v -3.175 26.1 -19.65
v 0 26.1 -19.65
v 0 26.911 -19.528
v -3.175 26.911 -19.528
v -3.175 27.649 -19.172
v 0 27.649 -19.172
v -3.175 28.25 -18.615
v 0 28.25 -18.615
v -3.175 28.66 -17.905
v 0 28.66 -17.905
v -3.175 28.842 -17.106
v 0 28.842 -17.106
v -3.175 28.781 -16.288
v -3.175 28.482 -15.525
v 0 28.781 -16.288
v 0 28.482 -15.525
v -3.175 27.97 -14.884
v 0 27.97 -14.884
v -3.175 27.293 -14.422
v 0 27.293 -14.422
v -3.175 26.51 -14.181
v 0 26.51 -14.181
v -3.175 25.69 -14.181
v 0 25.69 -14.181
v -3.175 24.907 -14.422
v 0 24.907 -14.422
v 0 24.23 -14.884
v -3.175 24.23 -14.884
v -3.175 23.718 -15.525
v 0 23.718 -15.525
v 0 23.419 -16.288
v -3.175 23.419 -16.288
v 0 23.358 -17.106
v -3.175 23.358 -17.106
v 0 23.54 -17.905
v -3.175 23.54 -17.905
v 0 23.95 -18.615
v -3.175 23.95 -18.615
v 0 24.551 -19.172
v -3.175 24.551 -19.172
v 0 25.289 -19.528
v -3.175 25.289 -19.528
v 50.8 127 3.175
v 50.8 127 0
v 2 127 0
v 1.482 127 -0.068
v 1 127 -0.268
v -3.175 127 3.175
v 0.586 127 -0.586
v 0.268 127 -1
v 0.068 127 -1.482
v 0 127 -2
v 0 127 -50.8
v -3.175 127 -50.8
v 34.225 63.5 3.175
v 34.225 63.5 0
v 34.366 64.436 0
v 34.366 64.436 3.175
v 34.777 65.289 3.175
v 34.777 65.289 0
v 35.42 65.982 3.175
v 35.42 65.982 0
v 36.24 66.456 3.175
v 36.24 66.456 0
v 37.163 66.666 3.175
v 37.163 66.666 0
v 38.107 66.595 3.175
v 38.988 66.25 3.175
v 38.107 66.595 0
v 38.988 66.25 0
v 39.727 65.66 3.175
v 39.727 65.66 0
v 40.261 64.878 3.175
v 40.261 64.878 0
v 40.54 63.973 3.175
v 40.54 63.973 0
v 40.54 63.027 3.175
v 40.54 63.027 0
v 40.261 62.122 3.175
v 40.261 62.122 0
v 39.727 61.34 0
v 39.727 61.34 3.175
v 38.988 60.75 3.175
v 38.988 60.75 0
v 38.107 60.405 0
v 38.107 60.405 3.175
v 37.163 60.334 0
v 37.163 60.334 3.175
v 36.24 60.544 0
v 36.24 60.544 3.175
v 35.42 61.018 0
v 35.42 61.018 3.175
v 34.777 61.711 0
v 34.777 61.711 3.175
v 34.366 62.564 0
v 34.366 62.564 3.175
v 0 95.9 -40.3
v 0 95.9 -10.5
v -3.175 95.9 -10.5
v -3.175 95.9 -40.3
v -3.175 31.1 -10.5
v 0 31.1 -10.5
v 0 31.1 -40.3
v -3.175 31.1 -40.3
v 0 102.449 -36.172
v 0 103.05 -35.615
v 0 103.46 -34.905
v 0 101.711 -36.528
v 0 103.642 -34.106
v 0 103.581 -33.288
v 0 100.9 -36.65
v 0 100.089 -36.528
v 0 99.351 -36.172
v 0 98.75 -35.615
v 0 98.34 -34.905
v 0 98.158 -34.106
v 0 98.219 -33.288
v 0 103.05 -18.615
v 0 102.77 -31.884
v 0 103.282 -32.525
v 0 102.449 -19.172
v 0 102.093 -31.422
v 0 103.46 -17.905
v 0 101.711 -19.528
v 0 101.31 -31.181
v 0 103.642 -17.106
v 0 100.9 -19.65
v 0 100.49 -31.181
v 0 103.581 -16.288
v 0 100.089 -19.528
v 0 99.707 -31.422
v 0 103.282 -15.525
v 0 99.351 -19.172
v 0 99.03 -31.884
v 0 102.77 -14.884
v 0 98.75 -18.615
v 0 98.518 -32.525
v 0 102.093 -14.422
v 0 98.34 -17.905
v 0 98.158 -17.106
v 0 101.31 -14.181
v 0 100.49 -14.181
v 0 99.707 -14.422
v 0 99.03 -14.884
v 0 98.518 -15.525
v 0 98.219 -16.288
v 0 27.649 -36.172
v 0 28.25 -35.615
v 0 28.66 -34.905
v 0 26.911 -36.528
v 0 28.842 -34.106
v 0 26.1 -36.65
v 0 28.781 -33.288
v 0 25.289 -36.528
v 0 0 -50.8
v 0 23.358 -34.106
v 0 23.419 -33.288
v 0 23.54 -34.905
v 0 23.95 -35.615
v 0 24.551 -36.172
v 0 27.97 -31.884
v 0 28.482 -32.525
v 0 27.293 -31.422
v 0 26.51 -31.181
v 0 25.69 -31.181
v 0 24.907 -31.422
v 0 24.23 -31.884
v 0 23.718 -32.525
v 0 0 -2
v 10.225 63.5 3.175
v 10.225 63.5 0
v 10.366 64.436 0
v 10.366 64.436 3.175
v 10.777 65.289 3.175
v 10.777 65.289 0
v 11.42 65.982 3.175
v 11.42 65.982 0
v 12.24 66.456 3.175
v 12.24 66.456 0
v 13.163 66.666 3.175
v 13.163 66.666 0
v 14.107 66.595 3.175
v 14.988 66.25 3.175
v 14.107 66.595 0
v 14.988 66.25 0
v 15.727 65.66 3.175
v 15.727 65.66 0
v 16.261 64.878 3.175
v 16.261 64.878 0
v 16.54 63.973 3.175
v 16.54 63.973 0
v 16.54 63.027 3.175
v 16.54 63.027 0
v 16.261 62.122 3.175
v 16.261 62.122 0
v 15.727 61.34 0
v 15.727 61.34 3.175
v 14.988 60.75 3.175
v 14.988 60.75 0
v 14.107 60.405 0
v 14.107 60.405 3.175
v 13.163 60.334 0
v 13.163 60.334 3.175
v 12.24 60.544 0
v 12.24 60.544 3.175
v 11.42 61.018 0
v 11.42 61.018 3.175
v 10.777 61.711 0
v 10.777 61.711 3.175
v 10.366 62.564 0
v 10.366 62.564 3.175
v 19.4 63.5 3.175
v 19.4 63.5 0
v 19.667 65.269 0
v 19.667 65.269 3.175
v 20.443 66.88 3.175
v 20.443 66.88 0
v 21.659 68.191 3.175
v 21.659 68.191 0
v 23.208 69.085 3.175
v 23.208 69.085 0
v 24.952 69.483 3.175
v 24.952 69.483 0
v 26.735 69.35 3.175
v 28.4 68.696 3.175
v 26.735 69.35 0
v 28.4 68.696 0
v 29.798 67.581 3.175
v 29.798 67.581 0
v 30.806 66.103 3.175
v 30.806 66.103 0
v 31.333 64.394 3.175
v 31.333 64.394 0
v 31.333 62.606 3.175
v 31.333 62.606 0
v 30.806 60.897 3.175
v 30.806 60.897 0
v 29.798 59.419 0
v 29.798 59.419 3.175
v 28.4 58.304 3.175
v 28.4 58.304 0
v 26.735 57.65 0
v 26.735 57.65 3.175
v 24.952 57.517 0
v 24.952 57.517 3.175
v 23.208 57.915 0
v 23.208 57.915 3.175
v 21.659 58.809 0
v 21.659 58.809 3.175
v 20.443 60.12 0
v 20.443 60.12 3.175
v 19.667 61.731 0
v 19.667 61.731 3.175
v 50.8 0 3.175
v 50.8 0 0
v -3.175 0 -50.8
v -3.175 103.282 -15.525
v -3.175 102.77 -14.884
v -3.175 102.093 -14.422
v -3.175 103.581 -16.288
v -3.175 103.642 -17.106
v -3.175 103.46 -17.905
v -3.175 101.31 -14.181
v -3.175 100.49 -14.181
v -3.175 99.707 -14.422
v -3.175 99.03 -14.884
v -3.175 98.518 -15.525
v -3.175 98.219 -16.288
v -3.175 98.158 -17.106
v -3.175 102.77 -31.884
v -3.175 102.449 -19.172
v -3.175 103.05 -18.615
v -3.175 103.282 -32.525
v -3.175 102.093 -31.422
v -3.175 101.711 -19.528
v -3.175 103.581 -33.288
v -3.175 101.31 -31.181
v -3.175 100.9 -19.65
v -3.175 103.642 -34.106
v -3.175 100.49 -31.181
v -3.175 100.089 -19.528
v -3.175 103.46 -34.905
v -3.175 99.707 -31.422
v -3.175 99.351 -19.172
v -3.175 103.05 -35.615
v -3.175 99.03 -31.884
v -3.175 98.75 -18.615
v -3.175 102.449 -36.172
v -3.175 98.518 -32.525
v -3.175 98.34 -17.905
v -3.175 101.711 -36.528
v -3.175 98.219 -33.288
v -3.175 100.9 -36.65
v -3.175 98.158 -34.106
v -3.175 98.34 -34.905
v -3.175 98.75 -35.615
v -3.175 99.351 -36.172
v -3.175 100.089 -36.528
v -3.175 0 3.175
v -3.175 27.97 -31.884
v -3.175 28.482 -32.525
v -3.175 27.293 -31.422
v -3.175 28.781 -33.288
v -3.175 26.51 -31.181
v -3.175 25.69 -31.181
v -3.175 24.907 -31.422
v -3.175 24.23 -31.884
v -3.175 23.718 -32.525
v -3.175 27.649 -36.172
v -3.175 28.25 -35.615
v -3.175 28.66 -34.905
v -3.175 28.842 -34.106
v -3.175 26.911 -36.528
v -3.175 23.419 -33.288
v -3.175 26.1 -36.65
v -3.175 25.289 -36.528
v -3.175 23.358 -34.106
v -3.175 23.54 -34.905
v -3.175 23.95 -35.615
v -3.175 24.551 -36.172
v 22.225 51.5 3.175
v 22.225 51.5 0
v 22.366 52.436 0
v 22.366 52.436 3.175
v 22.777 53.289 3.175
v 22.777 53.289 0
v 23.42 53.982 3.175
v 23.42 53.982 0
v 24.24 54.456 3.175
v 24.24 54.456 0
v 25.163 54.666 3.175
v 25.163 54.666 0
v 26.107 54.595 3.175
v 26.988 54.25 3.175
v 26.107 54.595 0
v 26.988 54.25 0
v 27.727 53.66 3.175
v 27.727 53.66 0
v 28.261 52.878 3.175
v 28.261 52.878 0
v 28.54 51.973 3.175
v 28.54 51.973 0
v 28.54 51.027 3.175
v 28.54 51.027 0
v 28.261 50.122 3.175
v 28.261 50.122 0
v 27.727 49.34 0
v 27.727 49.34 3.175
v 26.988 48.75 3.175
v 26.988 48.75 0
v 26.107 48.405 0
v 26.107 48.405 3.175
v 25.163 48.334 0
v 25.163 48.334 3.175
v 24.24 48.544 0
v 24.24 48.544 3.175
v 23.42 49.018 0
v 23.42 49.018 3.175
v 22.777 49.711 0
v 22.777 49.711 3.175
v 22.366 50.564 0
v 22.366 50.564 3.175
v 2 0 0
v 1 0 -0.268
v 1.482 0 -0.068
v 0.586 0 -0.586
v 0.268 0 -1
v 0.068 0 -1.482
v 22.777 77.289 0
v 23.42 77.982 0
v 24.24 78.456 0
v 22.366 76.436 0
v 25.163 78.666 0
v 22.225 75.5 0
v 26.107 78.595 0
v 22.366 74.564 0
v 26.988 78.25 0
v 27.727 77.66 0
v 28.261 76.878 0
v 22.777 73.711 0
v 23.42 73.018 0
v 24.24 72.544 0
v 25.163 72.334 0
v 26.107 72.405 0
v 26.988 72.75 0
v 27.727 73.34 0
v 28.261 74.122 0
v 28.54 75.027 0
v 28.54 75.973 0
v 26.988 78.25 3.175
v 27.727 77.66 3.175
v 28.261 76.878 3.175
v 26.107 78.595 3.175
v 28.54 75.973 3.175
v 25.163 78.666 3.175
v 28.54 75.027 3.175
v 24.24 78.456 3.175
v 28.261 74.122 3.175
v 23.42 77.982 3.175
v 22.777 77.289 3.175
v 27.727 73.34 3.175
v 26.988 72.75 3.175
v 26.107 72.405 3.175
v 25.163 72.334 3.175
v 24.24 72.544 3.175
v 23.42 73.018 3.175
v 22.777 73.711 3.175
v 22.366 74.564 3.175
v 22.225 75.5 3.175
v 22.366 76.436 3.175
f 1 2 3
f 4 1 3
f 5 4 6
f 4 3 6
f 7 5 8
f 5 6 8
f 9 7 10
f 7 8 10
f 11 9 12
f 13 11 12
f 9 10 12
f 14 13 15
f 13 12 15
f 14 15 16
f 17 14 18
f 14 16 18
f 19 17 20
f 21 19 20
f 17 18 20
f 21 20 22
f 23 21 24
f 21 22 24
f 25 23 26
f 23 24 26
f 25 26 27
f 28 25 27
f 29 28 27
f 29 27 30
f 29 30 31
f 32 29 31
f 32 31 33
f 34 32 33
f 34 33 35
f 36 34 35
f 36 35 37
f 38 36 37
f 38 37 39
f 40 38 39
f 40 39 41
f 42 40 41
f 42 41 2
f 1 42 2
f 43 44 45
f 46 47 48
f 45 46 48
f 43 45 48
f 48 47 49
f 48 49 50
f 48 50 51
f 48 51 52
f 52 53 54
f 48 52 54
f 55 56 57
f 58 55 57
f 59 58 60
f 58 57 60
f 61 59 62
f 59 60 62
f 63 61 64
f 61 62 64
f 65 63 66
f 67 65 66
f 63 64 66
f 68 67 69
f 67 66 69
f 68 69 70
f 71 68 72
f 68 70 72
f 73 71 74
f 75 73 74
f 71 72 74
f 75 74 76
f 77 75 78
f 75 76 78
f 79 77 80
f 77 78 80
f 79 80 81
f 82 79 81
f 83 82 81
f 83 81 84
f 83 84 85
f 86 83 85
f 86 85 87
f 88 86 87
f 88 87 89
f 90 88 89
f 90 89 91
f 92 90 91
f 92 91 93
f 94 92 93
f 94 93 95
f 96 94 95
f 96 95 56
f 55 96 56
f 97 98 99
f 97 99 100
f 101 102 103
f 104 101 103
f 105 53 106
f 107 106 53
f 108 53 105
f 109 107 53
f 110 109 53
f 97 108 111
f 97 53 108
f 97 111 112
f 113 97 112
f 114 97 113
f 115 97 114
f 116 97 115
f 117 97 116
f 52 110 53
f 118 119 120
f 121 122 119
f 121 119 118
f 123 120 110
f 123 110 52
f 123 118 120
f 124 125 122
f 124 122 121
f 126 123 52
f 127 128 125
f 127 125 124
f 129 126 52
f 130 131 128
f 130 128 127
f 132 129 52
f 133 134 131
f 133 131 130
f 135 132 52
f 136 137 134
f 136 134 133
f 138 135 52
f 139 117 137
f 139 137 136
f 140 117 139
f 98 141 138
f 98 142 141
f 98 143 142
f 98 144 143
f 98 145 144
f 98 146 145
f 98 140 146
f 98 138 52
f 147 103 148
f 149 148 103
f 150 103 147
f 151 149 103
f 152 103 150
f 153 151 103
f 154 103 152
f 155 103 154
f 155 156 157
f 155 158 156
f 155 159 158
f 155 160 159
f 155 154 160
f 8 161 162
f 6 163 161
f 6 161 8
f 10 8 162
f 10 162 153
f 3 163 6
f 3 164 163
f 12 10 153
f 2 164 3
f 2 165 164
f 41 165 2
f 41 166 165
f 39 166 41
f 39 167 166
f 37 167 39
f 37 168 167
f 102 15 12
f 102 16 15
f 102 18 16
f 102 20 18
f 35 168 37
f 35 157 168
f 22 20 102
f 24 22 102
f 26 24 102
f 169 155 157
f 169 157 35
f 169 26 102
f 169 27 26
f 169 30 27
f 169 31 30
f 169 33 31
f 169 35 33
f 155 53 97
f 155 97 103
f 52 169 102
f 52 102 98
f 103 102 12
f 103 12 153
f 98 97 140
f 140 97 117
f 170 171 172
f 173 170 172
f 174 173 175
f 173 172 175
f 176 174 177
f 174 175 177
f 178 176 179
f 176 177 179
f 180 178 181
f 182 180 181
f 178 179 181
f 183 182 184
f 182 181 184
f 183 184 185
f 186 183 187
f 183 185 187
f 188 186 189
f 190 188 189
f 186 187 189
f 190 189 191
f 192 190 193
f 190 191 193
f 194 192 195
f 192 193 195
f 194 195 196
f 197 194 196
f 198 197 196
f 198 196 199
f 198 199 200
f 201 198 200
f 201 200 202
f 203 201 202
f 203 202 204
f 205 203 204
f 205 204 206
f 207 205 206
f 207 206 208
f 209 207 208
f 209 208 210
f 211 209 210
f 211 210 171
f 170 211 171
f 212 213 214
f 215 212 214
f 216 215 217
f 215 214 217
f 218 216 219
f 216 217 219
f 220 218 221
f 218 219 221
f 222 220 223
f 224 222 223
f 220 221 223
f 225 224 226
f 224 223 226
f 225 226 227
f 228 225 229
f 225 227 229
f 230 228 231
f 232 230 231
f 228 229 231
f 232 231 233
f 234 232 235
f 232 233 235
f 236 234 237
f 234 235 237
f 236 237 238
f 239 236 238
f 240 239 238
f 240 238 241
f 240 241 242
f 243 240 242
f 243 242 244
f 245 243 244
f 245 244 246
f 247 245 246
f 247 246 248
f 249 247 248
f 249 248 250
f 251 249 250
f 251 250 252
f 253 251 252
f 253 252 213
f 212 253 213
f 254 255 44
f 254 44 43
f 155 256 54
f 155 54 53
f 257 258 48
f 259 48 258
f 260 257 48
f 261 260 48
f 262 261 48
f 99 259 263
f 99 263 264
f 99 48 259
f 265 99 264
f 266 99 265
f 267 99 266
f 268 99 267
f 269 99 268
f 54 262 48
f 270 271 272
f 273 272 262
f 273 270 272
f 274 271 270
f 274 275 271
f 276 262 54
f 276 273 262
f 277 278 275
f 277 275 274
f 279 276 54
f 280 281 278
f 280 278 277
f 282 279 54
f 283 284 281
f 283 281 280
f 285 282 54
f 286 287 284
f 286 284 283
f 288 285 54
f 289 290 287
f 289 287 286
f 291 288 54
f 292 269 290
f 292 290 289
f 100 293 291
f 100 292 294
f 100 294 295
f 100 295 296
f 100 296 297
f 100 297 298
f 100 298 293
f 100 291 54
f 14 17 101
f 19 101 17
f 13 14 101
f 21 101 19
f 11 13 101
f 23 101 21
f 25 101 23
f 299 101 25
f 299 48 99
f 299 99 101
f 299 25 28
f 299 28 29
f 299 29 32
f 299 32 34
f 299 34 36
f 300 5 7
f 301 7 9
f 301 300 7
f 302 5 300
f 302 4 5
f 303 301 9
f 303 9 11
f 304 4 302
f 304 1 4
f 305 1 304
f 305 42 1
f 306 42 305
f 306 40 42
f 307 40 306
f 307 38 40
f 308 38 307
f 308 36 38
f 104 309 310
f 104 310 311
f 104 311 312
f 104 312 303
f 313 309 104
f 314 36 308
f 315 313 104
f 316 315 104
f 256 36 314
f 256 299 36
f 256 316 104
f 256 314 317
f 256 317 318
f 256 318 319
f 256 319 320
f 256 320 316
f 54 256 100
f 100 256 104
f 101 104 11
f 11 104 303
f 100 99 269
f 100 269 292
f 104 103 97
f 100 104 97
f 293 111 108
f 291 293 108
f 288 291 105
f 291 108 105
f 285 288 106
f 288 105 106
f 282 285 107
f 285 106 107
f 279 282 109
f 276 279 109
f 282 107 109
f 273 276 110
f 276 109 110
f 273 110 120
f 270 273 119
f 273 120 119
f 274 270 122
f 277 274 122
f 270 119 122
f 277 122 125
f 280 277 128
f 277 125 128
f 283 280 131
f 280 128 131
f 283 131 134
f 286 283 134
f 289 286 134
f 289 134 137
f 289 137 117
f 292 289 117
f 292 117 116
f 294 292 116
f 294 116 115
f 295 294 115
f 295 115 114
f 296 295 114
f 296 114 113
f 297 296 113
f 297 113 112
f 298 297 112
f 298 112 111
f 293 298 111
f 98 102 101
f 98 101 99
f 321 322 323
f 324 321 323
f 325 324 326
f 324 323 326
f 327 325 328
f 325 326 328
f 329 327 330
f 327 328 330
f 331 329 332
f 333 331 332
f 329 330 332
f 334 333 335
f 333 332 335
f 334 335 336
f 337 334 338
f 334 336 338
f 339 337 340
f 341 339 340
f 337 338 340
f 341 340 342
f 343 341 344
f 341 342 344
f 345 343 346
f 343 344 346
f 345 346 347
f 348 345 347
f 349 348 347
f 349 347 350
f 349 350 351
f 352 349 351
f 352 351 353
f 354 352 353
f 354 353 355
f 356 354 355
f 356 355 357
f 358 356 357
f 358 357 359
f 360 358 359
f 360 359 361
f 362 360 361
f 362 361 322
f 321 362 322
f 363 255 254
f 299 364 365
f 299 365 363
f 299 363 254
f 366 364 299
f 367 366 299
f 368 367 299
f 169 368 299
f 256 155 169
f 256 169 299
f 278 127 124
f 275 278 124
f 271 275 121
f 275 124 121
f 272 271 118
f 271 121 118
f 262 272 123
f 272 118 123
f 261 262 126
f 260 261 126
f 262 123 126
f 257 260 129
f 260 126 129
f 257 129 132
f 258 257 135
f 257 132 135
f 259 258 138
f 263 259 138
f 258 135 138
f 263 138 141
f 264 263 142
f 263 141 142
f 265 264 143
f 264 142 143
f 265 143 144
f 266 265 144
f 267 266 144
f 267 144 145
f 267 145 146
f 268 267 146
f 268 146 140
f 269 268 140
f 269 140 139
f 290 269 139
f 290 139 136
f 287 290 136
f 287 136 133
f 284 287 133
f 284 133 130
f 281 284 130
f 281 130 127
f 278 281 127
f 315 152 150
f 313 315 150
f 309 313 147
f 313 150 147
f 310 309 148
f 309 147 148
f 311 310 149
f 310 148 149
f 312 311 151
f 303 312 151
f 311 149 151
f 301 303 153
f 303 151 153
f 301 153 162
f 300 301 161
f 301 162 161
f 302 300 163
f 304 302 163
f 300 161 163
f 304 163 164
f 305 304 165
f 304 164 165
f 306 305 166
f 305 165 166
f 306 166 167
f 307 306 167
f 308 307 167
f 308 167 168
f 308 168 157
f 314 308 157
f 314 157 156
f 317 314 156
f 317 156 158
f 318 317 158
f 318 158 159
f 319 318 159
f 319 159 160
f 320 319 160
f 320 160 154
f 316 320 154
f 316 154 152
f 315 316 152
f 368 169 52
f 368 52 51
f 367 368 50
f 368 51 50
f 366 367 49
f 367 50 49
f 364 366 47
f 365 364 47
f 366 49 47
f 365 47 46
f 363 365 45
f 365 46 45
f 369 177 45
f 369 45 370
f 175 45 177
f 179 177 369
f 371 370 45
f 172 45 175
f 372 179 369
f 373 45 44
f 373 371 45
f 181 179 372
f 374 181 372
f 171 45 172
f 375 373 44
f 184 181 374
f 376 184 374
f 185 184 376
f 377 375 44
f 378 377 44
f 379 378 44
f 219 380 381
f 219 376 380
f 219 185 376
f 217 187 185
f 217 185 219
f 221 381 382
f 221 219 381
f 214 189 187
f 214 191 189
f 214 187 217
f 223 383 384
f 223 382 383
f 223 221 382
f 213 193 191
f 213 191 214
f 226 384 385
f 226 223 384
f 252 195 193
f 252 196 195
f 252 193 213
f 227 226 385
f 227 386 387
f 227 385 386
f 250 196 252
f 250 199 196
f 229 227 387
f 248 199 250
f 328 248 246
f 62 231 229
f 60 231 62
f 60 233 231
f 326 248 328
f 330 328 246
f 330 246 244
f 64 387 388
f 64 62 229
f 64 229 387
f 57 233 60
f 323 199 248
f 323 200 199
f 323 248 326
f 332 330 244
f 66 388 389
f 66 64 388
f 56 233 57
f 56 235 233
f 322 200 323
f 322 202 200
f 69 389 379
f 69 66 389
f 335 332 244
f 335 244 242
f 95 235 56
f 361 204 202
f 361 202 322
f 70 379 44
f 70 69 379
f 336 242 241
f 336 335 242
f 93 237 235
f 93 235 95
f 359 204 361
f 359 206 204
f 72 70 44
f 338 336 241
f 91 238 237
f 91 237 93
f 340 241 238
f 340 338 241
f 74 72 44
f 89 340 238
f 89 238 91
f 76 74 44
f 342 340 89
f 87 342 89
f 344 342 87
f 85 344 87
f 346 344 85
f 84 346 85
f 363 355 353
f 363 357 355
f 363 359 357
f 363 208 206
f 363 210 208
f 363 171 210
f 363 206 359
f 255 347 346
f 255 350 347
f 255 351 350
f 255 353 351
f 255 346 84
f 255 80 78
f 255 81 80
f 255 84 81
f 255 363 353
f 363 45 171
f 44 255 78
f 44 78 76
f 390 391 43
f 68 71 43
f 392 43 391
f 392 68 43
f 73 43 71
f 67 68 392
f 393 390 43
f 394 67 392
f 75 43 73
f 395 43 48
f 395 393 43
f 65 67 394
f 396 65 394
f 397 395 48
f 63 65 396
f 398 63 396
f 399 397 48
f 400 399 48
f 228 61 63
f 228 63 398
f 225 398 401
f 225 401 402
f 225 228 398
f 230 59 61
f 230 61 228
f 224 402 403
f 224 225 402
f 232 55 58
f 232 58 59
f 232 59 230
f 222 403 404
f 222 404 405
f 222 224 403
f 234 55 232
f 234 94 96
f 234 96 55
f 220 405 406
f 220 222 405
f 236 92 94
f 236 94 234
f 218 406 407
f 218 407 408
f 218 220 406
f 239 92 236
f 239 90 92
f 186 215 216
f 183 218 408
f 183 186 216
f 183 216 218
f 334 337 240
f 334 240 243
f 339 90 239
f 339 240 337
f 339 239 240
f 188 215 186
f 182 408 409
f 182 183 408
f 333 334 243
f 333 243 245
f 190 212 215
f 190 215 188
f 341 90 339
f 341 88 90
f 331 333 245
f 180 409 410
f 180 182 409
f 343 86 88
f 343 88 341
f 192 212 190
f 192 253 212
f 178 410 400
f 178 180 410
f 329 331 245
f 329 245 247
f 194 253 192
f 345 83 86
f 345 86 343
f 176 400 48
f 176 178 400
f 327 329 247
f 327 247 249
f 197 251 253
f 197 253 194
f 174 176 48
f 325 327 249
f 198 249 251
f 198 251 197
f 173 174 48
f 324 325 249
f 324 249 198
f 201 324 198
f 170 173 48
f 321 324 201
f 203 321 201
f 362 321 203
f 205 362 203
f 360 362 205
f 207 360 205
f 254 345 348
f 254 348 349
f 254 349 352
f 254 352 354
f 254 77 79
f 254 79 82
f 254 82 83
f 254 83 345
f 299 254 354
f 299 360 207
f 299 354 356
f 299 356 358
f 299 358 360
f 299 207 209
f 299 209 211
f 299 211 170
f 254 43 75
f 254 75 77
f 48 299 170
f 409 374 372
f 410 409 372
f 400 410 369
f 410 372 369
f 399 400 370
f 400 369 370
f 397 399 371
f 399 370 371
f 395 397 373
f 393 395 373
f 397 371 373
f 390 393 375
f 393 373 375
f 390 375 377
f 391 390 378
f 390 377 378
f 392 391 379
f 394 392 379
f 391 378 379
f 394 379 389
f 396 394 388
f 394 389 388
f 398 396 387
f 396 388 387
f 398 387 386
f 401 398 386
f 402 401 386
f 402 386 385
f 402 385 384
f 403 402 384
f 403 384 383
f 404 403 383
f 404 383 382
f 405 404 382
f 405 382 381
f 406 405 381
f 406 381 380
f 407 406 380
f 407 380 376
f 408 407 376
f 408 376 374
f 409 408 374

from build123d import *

# Parameters (mm, degrees)
BOSS_EXTRUDE1_DEPTH = 127
CUT_EXTRUDE1_REACH  = 147.912
SKETCH2_R           = 6
SKETCH2_R_2         = 3.175
CUT_EXTRUDE2_REACH  = 147.912
SKETCH3_R           = 2.75
SKETCH3_W           = 29.8
SKETCH3_H           = 64.8
FILLET1_R           = 2


with BuildPart() as part:
    # Sketch1 → Boss-Extrude1 (new body)
    with BuildSketch(Plane(origin=(0, 0, 0), x_dir=(1, 0, 0), z_dir=(0, 1, 0))):
        Polygon((0, 50.8), (0, 0), (50.8, 0), (50.8, -3.175), (-3.175, -3.175), (-3.175, 50.8), align=None)
    extrude(amount=BOSS_EXTRUDE1_DEPTH)

    # Sketch2 → Cut-Extrude1 (cut, up to next)
    with BuildSketch(Plane(origin=(0, 0, 0), x_dir=(-1, 0, 0), z_dir=(0, 0, -1)), mode=Mode.PRIVATE) as cut_extrude1_sk1:
        with Locations((-25.4, 63.5)):
            Circle(SKETCH2_R)
    cut_extrude1_tool1 = extrude(cut_extrude1_sk1.sketch, amount=-CUT_EXTRUDE1_REACH, mode=Mode.PRIVATE) & part.part
    # Sketch2 → Cut-Extrude1 (cut, up to next)
    with BuildSketch(Plane(origin=(0, 0, 0), x_dir=(-1, 0, 0), z_dir=(0, 0, -1)), mode=Mode.PRIVATE) as cut_extrude1_sk2:
        with Locations((-25.4, 75.5)):
            Circle(SKETCH2_R_2)
    cut_extrude1_tool2 = extrude(cut_extrude1_sk2.sketch, amount=-CUT_EXTRUDE1_REACH, mode=Mode.PRIVATE) & part.part
    # Sketch2 → Cut-Extrude1 (cut, up to next)
    with BuildSketch(Plane(origin=(0, 0, 0), x_dir=(-1, 0, 0), z_dir=(0, 0, -1)), mode=Mode.PRIVATE) as cut_extrude1_sk3:
        with Locations((-13.4, 63.5)):
            Circle(SKETCH2_R_2)
    cut_extrude1_tool3 = extrude(cut_extrude1_sk3.sketch, amount=-CUT_EXTRUDE1_REACH, mode=Mode.PRIVATE) & part.part
    # Sketch2 → Cut-Extrude1 (cut, up to next)
    with BuildSketch(Plane(origin=(0, 0, 0), x_dir=(-1, 0, 0), z_dir=(0, 0, -1)), mode=Mode.PRIVATE) as cut_extrude1_sk4:
        with Locations((-25.4, 51.5)):
            Circle(SKETCH2_R_2)
    cut_extrude1_tool4 = extrude(cut_extrude1_sk4.sketch, amount=-CUT_EXTRUDE1_REACH, mode=Mode.PRIVATE) & part.part
    # Sketch2 → Cut-Extrude1 (cut, up to next)
    with BuildSketch(Plane(origin=(0, 0, 0), x_dir=(-1, 0, 0), z_dir=(0, 0, -1)), mode=Mode.PRIVATE) as cut_extrude1_sk5:
        with Locations((-37.4, 63.5)):
            Circle(SKETCH2_R_2)
    cut_extrude1_tool5 = extrude(cut_extrude1_sk5.sketch, amount=-CUT_EXTRUDE1_REACH, mode=Mode.PRIVATE) & part.part
    add(cut_extrude1_tool1.solids().sort_by_distance((25.4, 63.5, 0))[0], mode=Mode.SUBTRACT)
    add(cut_extrude1_tool2.solids().sort_by_distance((25.4, 75.5, 0))[0], mode=Mode.SUBTRACT)
    add(cut_extrude1_tool3.solids().sort_by_distance((13.4, 63.5, 0))[0], mode=Mode.SUBTRACT)
    add(cut_extrude1_tool4.solids().sort_by_distance((25.4, 51.5, 0))[0], mode=Mode.SUBTRACT)
    add(cut_extrude1_tool5.solids().sort_by_distance((37.4, 63.5, 0))[0], mode=Mode.SUBTRACT)

    # Sketch3 → Cut-Extrude2 (cut, up to next)
    with BuildSketch(Plane(origin=(0, 0, 0), x_dir=(0, 0, -1), z_dir=(1, 0, 0)), mode=Mode.PRIVATE) as cut_extrude2_sk1:
        with Locations((33.9, 100.9)):
            Circle(SKETCH3_R)
    cut_extrude2_tool1 = extrude(cut_extrude2_sk1.sketch, amount=-CUT_EXTRUDE2_REACH, mode=Mode.PRIVATE) & part.part
    # Sketch3 → Cut-Extrude2 (cut, up to next)
    with BuildSketch(Plane(origin=(0, 0, 0), x_dir=(0, 0, -1), z_dir=(1, 0, 0)), mode=Mode.PRIVATE) as cut_extrude2_sk2:
        with Locations((16.9, 100.9)):
            Circle(SKETCH3_R)
    cut_extrude2_tool2 = extrude(cut_extrude2_sk2.sketch, amount=-CUT_EXTRUDE2_REACH, mode=Mode.PRIVATE) & part.part
    # Sketch3 → Cut-Extrude2 (cut, up to next)
    with BuildSketch(Plane(origin=(0, 0, 0), x_dir=(0, 0, -1), z_dir=(1, 0, 0)), mode=Mode.PRIVATE) as cut_extrude2_sk3:
        with Locations((16.9, 26.1)):
            Circle(SKETCH3_R)
    cut_extrude2_tool3 = extrude(cut_extrude2_sk3.sketch, amount=-CUT_EXTRUDE2_REACH, mode=Mode.PRIVATE) & part.part
    # Sketch3 → Cut-Extrude2 (cut, up to next)
    with BuildSketch(Plane(origin=(0, 0, 0), x_dir=(0, 0, -1), z_dir=(1, 0, 0)), mode=Mode.PRIVATE) as cut_extrude2_sk4:
        with Locations((33.9, 26.1)):
            Circle(SKETCH3_R)
    cut_extrude2_tool4 = extrude(cut_extrude2_sk4.sketch, amount=-CUT_EXTRUDE2_REACH, mode=Mode.PRIVATE) & part.part
    # Sketch3 → Cut-Extrude2 (cut, up to next)
    with BuildSketch(Plane(origin=(0, 0, 0), x_dir=(0, 0, -1), z_dir=(1, 0, 0)), mode=Mode.PRIVATE) as cut_extrude2_sk5:
        with Locations((25.4, 63.5)):
            Rectangle(SKETCH3_W, SKETCH3_H)
    cut_extrude2_tool5 = extrude(cut_extrude2_sk5.sketch, amount=-CUT_EXTRUDE2_REACH, mode=Mode.PRIVATE) & part.part
    add(cut_extrude2_tool1.solids().sort_by_distance((0, 100.9, -33.9))[0], mode=Mode.SUBTRACT)
    add(cut_extrude2_tool2.solids().sort_by_distance((0, 100.9, -16.9))[0], mode=Mode.SUBTRACT)
    add(cut_extrude2_tool3.solids().sort_by_distance((0, 26.1, -16.9))[0], mode=Mode.SUBTRACT)
    add(cut_extrude2_tool4.solids().sort_by_distance((0, 26.1, -33.9))[0], mode=Mode.SUBTRACT)
    add(cut_extrude2_tool5.solids().sort_by_distance((0, 63.5, -25.4))[0], mode=Mode.SUBTRACT)

    # Fillet1
    fillet1_edges = [part.edges().sort_by_distance(p)[0] for p in [
        (0, 63.5, 0),
    ]]
    fillet(fillet1_edges, radius=FILLET1_R)


solid = part.part
